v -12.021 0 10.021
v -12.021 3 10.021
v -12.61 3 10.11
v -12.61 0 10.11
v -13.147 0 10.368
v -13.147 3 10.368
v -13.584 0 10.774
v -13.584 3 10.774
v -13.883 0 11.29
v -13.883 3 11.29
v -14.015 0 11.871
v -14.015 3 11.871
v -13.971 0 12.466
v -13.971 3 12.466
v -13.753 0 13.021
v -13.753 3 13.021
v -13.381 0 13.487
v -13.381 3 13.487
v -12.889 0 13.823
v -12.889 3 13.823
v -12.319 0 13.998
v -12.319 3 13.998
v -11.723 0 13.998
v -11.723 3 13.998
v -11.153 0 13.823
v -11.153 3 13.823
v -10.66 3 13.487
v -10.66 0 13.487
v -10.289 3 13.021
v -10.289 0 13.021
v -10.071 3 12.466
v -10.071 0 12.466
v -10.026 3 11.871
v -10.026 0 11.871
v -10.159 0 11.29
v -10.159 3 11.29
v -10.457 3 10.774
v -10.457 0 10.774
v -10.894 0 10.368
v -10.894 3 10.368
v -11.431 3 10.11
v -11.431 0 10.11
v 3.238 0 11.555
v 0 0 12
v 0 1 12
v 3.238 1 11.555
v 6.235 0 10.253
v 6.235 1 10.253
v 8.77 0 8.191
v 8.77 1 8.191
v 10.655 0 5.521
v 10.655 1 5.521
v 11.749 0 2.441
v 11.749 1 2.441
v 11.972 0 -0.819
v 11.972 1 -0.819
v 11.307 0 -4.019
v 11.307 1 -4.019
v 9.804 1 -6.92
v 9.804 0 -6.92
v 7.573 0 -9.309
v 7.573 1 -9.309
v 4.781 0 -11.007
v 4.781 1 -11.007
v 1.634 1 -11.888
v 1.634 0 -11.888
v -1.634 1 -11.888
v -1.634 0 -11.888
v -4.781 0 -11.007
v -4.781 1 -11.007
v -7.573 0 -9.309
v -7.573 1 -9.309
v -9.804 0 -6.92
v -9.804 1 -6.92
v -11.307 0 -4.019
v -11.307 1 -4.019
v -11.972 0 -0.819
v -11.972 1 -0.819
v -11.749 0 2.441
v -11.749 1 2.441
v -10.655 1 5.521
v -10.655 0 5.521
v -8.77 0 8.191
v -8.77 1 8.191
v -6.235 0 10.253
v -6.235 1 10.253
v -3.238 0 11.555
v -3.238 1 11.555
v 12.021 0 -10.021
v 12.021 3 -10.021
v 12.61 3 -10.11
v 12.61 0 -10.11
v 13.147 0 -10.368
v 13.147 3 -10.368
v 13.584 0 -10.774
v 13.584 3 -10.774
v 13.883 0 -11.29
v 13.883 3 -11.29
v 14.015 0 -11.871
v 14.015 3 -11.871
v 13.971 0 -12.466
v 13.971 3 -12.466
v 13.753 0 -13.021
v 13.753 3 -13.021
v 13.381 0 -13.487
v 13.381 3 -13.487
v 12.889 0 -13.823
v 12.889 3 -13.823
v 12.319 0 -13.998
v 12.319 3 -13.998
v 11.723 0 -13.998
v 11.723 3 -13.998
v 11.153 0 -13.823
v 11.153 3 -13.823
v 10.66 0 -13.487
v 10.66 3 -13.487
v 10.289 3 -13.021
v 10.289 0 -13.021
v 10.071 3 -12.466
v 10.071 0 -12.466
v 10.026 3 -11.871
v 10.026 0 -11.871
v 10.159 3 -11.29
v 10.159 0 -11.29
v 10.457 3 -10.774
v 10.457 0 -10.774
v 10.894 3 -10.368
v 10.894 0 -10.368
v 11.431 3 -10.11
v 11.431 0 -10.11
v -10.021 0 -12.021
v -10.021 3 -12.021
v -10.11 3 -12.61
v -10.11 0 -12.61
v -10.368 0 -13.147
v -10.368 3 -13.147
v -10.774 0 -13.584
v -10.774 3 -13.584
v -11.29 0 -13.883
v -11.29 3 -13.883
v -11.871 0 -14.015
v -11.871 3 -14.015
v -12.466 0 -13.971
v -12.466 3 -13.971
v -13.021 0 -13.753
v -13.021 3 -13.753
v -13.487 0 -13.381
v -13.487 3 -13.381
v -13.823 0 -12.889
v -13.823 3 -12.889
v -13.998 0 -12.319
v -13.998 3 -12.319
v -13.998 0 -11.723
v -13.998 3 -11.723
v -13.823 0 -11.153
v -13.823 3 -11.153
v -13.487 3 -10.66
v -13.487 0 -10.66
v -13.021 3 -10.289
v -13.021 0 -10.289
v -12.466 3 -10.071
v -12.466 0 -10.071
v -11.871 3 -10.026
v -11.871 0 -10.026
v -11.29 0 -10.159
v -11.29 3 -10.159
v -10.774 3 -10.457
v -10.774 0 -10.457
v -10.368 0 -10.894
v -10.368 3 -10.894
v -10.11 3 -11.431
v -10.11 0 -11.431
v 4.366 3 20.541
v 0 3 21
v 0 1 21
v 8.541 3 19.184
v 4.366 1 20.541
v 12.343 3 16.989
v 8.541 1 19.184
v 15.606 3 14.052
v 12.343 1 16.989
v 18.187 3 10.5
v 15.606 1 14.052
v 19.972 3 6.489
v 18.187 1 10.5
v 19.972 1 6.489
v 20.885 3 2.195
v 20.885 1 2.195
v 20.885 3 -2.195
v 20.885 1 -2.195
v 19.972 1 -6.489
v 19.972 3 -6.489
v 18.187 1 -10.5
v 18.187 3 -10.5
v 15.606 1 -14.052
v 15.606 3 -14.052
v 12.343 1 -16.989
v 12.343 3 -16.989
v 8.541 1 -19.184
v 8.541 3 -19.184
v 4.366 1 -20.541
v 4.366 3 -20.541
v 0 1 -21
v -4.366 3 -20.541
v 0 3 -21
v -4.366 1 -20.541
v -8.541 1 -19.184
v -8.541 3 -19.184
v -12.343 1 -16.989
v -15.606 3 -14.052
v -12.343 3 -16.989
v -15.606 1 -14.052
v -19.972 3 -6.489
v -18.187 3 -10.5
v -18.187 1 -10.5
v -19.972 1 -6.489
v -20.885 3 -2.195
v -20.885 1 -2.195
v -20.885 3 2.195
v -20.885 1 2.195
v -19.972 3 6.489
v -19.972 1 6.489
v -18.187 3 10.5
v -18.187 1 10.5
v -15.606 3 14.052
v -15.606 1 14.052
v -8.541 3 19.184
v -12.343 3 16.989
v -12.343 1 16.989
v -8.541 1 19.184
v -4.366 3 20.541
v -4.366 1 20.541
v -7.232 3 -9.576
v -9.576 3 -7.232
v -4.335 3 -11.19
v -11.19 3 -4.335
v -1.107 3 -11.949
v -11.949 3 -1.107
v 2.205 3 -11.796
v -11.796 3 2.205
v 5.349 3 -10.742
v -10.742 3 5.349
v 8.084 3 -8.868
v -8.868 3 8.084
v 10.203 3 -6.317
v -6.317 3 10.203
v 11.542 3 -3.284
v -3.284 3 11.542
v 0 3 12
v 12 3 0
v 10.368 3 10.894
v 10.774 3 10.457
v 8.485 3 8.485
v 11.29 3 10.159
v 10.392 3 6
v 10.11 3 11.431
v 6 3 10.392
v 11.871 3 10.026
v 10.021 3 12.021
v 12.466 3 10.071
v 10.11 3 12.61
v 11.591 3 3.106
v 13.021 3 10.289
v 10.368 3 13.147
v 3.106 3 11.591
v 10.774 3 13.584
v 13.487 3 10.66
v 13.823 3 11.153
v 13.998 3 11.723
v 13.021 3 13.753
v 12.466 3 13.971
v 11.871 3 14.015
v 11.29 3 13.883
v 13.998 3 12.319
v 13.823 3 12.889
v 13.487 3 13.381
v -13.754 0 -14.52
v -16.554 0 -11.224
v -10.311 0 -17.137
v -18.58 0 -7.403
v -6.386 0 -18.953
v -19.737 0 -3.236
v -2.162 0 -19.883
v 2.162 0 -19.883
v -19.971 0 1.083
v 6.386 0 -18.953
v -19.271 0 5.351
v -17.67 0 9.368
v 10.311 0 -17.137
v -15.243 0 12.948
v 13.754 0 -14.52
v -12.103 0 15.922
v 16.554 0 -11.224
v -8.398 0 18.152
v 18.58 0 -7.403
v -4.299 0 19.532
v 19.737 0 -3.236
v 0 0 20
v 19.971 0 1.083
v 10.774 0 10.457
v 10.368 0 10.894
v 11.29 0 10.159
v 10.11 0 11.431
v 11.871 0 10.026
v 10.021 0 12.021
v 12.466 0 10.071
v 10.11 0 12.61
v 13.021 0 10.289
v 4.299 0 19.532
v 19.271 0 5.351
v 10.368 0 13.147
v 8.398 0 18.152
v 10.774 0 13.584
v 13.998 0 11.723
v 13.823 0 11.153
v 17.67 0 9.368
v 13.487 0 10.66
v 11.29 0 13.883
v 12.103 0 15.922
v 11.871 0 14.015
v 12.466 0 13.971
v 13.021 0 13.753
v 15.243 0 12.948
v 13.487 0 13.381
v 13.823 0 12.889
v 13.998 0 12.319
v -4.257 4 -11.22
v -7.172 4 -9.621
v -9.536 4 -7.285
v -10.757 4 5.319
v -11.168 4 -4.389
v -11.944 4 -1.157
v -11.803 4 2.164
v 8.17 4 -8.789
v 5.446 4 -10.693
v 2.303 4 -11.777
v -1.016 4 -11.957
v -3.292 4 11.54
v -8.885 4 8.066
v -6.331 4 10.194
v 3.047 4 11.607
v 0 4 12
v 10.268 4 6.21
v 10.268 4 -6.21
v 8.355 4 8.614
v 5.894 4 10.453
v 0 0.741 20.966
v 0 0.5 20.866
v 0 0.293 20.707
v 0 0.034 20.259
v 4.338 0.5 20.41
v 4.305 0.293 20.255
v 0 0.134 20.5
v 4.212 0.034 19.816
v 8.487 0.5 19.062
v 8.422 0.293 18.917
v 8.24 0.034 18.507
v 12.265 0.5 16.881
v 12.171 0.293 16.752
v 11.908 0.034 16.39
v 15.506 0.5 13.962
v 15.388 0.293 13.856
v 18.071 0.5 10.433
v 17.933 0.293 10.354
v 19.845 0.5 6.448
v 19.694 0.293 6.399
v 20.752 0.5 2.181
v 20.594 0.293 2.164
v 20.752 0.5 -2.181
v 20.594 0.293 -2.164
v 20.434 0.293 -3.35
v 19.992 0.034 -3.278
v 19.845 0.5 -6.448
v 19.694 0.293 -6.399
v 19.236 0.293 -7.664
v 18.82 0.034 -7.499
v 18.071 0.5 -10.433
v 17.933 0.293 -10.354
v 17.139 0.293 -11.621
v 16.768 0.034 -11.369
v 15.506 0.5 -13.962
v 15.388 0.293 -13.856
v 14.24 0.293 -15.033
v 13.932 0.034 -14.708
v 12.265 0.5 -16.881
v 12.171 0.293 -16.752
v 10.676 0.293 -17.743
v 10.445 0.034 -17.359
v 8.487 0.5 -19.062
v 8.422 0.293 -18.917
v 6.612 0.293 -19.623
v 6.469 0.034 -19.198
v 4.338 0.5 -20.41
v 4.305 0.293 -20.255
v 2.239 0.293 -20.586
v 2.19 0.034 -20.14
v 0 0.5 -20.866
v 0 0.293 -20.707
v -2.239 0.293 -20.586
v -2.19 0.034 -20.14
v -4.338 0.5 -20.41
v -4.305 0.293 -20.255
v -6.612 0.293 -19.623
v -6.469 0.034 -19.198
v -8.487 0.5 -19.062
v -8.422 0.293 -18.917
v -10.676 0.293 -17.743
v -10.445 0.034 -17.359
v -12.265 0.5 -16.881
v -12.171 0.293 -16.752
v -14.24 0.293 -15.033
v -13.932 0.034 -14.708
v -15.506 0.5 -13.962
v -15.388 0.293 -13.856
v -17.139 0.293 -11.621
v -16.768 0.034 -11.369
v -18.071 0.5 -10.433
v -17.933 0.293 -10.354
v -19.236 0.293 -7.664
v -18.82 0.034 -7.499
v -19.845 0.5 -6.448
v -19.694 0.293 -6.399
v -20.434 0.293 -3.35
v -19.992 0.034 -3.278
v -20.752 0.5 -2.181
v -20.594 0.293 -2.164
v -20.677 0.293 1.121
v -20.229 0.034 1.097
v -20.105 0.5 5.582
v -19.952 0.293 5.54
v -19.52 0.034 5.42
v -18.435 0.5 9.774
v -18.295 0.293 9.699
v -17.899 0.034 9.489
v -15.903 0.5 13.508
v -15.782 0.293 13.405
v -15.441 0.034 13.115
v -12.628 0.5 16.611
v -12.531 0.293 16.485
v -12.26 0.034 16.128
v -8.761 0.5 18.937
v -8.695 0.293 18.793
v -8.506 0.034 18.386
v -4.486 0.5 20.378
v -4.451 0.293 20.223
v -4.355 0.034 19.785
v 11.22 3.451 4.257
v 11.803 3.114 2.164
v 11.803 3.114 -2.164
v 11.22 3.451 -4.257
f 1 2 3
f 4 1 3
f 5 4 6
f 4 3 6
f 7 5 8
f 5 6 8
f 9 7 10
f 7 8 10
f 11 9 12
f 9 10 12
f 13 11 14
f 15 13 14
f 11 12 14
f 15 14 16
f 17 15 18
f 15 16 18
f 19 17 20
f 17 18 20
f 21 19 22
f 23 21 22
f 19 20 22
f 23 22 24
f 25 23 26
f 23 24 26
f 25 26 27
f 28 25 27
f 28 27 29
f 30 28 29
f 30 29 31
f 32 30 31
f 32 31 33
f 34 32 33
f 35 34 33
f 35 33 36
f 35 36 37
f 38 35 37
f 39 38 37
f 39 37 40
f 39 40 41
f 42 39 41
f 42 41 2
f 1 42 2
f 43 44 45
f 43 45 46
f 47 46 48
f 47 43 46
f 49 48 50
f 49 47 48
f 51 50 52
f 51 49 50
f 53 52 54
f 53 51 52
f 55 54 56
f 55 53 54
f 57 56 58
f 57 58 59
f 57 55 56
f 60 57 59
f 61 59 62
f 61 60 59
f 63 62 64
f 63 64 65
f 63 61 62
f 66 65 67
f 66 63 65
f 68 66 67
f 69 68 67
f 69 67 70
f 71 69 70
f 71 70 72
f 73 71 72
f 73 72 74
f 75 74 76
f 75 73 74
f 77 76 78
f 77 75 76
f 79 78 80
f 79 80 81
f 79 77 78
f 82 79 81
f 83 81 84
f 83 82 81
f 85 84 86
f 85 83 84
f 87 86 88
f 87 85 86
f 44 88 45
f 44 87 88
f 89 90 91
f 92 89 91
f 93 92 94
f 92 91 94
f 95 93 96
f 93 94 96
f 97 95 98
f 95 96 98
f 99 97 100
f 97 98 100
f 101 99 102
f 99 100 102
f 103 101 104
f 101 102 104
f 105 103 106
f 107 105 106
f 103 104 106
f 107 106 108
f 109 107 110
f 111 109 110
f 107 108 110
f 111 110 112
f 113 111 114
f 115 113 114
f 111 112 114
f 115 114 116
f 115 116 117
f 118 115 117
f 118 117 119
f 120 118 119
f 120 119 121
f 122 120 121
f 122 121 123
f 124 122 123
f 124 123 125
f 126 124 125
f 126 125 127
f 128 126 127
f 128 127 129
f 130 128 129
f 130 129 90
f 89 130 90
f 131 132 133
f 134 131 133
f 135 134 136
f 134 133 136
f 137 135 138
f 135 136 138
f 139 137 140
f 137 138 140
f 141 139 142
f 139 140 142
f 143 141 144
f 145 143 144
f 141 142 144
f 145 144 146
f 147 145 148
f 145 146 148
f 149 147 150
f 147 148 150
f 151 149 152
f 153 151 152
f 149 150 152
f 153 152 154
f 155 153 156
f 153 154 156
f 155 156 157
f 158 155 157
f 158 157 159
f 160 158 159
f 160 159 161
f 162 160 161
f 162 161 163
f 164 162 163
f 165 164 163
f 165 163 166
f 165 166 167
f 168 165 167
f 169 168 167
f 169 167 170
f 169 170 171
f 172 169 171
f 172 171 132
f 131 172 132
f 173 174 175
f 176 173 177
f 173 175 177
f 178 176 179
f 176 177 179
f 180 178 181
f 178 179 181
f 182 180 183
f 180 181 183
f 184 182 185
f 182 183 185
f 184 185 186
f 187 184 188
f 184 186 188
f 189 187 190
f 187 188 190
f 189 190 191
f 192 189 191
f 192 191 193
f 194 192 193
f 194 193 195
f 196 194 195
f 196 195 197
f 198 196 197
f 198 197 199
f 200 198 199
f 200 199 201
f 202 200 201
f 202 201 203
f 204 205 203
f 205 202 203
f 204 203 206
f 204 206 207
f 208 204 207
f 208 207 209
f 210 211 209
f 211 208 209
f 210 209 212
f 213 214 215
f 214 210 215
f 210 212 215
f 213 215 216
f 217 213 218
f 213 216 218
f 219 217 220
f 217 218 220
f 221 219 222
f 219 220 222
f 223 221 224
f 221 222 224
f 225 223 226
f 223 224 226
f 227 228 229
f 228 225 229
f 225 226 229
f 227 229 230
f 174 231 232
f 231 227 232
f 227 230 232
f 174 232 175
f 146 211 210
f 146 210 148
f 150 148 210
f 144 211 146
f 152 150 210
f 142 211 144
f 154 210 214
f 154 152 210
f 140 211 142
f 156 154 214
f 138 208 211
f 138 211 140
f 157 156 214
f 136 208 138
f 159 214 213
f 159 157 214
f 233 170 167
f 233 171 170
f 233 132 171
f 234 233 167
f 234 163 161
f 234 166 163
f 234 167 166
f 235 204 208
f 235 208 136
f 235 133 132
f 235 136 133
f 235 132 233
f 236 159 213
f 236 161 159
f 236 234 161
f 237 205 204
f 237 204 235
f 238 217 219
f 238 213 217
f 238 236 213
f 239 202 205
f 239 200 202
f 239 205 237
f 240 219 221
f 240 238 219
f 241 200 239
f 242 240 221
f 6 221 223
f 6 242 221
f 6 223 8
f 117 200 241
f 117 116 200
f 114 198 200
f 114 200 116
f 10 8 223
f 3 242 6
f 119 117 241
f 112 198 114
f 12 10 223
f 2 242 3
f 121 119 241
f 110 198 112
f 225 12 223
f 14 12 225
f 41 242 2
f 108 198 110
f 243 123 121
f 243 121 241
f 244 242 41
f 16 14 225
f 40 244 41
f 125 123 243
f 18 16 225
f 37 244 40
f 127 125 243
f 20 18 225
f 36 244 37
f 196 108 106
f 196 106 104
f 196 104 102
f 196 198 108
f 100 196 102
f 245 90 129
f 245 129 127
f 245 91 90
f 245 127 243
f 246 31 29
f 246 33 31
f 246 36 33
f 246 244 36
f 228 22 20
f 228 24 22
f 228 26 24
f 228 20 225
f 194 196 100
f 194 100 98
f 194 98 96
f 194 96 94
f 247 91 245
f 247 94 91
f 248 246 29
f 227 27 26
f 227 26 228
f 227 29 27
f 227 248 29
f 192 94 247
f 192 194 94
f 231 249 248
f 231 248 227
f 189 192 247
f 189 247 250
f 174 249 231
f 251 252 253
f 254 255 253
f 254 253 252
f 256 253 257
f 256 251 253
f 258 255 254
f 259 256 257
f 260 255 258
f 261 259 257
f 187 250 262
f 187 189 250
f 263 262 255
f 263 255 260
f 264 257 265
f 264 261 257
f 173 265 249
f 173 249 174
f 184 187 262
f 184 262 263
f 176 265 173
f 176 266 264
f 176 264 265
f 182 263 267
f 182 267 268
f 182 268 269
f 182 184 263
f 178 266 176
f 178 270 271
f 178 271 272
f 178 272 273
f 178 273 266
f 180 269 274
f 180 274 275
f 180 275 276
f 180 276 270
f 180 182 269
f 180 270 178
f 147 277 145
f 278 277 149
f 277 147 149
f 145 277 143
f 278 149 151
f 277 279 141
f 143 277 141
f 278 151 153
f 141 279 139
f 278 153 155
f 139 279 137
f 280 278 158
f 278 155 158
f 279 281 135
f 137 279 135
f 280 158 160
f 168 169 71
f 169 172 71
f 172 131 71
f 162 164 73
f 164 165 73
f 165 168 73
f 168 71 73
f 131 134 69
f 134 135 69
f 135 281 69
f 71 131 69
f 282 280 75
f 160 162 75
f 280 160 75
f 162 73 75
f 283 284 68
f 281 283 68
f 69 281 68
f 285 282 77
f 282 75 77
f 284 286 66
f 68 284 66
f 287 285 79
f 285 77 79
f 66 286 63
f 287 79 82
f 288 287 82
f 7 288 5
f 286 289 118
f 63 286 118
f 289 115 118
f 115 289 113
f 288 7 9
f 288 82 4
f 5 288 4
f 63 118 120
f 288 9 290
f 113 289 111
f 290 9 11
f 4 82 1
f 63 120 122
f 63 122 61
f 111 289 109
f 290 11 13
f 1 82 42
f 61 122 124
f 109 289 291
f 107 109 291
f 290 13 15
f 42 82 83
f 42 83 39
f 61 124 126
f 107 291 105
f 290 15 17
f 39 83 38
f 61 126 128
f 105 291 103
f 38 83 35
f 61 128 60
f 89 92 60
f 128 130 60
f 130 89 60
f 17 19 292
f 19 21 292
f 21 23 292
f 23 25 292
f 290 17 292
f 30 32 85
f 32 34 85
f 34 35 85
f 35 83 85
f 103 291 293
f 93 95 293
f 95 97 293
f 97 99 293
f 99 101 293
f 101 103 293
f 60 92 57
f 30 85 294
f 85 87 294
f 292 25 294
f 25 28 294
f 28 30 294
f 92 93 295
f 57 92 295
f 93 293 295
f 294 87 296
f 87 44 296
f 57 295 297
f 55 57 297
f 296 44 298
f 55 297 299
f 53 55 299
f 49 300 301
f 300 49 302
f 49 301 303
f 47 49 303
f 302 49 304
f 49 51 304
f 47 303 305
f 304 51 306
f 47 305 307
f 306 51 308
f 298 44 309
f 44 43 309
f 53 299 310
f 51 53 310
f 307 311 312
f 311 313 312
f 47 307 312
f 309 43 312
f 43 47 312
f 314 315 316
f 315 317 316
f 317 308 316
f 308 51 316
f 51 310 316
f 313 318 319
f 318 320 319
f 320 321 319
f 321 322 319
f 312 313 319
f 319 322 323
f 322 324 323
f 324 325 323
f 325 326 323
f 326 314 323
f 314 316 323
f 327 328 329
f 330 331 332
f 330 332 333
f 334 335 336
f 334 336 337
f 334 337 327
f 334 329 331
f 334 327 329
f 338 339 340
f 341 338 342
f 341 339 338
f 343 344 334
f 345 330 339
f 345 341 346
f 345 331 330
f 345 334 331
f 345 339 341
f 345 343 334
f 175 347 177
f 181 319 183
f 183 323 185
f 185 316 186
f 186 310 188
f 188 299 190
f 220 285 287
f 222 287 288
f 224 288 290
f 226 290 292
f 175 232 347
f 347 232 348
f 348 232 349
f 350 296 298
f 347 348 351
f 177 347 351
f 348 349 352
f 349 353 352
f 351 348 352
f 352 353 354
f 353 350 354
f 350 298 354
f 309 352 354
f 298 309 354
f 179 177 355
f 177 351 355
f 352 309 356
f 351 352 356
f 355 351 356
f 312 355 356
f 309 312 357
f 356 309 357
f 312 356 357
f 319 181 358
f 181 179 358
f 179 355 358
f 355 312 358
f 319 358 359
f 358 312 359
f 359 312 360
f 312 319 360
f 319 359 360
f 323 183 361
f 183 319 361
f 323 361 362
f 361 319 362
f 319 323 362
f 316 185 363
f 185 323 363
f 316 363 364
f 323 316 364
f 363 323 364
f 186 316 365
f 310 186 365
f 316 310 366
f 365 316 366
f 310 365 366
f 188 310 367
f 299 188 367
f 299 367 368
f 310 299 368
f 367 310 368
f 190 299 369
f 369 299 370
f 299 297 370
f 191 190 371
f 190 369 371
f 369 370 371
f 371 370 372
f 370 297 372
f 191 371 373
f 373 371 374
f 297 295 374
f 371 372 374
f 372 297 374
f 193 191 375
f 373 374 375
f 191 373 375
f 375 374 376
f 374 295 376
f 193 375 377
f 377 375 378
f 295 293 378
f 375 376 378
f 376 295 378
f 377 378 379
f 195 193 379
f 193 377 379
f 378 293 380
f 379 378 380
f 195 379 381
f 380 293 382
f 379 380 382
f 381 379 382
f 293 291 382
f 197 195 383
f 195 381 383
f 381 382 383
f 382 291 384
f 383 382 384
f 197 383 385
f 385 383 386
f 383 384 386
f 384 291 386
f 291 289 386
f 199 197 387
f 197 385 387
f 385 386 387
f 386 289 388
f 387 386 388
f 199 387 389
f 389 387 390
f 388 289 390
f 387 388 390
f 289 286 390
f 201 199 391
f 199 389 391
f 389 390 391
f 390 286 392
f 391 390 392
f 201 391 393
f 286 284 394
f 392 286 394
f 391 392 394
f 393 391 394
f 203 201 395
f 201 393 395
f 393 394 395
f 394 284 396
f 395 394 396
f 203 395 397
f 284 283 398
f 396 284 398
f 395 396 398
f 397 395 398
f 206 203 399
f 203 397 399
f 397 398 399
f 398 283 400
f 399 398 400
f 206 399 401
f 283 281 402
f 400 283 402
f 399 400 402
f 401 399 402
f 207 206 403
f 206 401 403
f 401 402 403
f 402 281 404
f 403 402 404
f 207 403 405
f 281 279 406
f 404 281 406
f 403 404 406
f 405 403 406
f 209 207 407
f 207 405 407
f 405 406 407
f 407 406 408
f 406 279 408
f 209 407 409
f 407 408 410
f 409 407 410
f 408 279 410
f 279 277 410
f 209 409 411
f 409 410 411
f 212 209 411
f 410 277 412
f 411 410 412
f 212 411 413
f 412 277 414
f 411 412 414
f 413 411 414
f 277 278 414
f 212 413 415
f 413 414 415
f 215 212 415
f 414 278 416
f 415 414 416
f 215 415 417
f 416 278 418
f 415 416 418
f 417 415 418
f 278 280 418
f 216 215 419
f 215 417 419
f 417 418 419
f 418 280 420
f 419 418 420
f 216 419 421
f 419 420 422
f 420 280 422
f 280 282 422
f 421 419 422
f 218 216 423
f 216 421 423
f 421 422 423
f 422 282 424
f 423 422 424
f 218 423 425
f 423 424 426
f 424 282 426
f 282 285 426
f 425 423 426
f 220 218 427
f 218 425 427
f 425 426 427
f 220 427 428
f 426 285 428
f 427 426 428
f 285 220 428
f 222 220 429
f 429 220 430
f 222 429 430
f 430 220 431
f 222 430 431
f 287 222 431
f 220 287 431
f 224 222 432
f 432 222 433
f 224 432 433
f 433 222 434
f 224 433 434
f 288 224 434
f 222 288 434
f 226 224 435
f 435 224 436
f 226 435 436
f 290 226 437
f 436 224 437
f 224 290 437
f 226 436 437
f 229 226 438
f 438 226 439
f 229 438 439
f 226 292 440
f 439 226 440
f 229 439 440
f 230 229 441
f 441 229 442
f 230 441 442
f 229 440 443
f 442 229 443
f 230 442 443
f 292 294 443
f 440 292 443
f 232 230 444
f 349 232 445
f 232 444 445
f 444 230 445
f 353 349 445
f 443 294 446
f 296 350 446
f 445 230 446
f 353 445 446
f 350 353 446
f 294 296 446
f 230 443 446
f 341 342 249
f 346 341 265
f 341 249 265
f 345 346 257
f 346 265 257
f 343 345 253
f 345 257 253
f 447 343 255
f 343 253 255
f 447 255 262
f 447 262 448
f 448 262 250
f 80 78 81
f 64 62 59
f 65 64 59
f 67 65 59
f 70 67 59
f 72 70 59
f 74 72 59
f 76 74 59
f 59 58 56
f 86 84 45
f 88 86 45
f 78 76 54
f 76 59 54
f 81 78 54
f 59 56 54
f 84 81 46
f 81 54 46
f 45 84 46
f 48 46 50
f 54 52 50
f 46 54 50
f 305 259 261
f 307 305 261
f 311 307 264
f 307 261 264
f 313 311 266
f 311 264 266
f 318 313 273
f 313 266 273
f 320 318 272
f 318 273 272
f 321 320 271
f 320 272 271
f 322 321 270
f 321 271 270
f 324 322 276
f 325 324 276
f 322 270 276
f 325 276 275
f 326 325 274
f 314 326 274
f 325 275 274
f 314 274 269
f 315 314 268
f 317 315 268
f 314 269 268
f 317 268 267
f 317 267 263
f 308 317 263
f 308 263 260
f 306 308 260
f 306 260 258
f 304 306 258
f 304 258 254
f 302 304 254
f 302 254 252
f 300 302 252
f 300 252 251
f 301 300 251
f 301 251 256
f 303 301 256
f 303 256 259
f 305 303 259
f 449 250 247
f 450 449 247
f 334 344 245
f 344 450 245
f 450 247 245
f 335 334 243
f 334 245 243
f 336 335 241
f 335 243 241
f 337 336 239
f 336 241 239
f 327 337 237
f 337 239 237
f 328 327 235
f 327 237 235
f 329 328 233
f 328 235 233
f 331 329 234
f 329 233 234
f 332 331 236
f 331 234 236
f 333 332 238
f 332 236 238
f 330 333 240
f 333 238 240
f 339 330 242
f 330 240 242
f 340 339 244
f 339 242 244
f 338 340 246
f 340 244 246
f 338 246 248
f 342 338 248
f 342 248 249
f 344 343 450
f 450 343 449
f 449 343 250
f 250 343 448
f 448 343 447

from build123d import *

# Parameters (mm, degrees)
SKETCH1_R           = 21
BOSS_EXTRUDE1_DEPTH = 3
SKETCH2_R           = 12
BOSS_EXTRUDE2_DEPTH = 1
CUT_EXTRUDE1_START  = -3
SKETCH2_2_R         = 12
CUT_EXTRUDE1_DEPTH  = 1
SKETCH3_R           = 2
CUT_EXTRUDE2_DEPTH  = 30.849623113
CIRPATTERN1_COUNT   = 4
FILLET1_R           = 1
CUT_EXTRUDE3_DEPTH  = 35.5


with BuildPart() as part:
    # Sketch1 → Boss-Extrude1 (new body)
    with BuildSketch(Plane(origin=(0, 0, 0), x_dir=(1, 0, 0), z_dir=(0, 1, 0))):
        Circle(SKETCH1_R)
    extrude(amount=BOSS_EXTRUDE1_DEPTH)

    # Sketch2 → Boss-Extrude2 (add)
    with BuildSketch(Plane(origin=(0, 3, 0), x_dir=(1, 0, 0), z_dir=(0, 1, 0))):
        Circle(SKETCH2_R)
    extrude(amount=BOSS_EXTRUDE2_DEPTH)

    # Sketch2<2> → Cut-Extrude1 (cut)
    with BuildSketch(Plane(origin=(0, 3, 0), x_dir=(1, 0, 0), z_dir=(0, 1, 0)).offset(CUT_EXTRUDE1_START)):
        Circle(SKETCH2_2_R)
    extrude(amount=CUT_EXTRUDE1_DEPTH, mode=Mode.SUBTRACT)

    # Sketch3 → Cut-Extrude2 (cut, through all)
    with BuildSketch(Plane(origin=(0, 3, 0), x_dir=(1, 0, 0), z_dir=(0, 1, 0))):
        with Locations((12.02081528, 12.02081528)):
            Circle(SKETCH3_R)
    cut_extrude2 = extrude(amount=-CUT_EXTRUDE2_DEPTH, mode=Mode.SUBTRACT)

    # CirPattern1: Cut-Extrude2 ×4 about axis
    cirpattern1_axis = Axis((0, 3, 0), (0, -1, 0))
    for i in range(1, CIRPATTERN1_COUNT):
        add(cut_extrude2.rotate(cirpattern1_axis, i * 360 / CIRPATTERN1_COUNT), mode=Mode.SUBTRACT)

    # Fillet1
    fillet1_edges = [part.edges().sort_by_distance(p)[0] for p in [
        (-21, 0, 0),
    ]]
    fillet(fillet1_edges, radius=FILLET1_R)

    # Sketch4 → Cut-Extrude3 (cut, symmetric)
    with BuildSketch(Plane.XY):
        Polygon((12, 3), (10.267949192, 4), (12, 4), align=None)
    extrude(amount=CUT_EXTRUDE3_DEPTH, both=True, mode=Mode.SUBTRACT)


solid = part.part
